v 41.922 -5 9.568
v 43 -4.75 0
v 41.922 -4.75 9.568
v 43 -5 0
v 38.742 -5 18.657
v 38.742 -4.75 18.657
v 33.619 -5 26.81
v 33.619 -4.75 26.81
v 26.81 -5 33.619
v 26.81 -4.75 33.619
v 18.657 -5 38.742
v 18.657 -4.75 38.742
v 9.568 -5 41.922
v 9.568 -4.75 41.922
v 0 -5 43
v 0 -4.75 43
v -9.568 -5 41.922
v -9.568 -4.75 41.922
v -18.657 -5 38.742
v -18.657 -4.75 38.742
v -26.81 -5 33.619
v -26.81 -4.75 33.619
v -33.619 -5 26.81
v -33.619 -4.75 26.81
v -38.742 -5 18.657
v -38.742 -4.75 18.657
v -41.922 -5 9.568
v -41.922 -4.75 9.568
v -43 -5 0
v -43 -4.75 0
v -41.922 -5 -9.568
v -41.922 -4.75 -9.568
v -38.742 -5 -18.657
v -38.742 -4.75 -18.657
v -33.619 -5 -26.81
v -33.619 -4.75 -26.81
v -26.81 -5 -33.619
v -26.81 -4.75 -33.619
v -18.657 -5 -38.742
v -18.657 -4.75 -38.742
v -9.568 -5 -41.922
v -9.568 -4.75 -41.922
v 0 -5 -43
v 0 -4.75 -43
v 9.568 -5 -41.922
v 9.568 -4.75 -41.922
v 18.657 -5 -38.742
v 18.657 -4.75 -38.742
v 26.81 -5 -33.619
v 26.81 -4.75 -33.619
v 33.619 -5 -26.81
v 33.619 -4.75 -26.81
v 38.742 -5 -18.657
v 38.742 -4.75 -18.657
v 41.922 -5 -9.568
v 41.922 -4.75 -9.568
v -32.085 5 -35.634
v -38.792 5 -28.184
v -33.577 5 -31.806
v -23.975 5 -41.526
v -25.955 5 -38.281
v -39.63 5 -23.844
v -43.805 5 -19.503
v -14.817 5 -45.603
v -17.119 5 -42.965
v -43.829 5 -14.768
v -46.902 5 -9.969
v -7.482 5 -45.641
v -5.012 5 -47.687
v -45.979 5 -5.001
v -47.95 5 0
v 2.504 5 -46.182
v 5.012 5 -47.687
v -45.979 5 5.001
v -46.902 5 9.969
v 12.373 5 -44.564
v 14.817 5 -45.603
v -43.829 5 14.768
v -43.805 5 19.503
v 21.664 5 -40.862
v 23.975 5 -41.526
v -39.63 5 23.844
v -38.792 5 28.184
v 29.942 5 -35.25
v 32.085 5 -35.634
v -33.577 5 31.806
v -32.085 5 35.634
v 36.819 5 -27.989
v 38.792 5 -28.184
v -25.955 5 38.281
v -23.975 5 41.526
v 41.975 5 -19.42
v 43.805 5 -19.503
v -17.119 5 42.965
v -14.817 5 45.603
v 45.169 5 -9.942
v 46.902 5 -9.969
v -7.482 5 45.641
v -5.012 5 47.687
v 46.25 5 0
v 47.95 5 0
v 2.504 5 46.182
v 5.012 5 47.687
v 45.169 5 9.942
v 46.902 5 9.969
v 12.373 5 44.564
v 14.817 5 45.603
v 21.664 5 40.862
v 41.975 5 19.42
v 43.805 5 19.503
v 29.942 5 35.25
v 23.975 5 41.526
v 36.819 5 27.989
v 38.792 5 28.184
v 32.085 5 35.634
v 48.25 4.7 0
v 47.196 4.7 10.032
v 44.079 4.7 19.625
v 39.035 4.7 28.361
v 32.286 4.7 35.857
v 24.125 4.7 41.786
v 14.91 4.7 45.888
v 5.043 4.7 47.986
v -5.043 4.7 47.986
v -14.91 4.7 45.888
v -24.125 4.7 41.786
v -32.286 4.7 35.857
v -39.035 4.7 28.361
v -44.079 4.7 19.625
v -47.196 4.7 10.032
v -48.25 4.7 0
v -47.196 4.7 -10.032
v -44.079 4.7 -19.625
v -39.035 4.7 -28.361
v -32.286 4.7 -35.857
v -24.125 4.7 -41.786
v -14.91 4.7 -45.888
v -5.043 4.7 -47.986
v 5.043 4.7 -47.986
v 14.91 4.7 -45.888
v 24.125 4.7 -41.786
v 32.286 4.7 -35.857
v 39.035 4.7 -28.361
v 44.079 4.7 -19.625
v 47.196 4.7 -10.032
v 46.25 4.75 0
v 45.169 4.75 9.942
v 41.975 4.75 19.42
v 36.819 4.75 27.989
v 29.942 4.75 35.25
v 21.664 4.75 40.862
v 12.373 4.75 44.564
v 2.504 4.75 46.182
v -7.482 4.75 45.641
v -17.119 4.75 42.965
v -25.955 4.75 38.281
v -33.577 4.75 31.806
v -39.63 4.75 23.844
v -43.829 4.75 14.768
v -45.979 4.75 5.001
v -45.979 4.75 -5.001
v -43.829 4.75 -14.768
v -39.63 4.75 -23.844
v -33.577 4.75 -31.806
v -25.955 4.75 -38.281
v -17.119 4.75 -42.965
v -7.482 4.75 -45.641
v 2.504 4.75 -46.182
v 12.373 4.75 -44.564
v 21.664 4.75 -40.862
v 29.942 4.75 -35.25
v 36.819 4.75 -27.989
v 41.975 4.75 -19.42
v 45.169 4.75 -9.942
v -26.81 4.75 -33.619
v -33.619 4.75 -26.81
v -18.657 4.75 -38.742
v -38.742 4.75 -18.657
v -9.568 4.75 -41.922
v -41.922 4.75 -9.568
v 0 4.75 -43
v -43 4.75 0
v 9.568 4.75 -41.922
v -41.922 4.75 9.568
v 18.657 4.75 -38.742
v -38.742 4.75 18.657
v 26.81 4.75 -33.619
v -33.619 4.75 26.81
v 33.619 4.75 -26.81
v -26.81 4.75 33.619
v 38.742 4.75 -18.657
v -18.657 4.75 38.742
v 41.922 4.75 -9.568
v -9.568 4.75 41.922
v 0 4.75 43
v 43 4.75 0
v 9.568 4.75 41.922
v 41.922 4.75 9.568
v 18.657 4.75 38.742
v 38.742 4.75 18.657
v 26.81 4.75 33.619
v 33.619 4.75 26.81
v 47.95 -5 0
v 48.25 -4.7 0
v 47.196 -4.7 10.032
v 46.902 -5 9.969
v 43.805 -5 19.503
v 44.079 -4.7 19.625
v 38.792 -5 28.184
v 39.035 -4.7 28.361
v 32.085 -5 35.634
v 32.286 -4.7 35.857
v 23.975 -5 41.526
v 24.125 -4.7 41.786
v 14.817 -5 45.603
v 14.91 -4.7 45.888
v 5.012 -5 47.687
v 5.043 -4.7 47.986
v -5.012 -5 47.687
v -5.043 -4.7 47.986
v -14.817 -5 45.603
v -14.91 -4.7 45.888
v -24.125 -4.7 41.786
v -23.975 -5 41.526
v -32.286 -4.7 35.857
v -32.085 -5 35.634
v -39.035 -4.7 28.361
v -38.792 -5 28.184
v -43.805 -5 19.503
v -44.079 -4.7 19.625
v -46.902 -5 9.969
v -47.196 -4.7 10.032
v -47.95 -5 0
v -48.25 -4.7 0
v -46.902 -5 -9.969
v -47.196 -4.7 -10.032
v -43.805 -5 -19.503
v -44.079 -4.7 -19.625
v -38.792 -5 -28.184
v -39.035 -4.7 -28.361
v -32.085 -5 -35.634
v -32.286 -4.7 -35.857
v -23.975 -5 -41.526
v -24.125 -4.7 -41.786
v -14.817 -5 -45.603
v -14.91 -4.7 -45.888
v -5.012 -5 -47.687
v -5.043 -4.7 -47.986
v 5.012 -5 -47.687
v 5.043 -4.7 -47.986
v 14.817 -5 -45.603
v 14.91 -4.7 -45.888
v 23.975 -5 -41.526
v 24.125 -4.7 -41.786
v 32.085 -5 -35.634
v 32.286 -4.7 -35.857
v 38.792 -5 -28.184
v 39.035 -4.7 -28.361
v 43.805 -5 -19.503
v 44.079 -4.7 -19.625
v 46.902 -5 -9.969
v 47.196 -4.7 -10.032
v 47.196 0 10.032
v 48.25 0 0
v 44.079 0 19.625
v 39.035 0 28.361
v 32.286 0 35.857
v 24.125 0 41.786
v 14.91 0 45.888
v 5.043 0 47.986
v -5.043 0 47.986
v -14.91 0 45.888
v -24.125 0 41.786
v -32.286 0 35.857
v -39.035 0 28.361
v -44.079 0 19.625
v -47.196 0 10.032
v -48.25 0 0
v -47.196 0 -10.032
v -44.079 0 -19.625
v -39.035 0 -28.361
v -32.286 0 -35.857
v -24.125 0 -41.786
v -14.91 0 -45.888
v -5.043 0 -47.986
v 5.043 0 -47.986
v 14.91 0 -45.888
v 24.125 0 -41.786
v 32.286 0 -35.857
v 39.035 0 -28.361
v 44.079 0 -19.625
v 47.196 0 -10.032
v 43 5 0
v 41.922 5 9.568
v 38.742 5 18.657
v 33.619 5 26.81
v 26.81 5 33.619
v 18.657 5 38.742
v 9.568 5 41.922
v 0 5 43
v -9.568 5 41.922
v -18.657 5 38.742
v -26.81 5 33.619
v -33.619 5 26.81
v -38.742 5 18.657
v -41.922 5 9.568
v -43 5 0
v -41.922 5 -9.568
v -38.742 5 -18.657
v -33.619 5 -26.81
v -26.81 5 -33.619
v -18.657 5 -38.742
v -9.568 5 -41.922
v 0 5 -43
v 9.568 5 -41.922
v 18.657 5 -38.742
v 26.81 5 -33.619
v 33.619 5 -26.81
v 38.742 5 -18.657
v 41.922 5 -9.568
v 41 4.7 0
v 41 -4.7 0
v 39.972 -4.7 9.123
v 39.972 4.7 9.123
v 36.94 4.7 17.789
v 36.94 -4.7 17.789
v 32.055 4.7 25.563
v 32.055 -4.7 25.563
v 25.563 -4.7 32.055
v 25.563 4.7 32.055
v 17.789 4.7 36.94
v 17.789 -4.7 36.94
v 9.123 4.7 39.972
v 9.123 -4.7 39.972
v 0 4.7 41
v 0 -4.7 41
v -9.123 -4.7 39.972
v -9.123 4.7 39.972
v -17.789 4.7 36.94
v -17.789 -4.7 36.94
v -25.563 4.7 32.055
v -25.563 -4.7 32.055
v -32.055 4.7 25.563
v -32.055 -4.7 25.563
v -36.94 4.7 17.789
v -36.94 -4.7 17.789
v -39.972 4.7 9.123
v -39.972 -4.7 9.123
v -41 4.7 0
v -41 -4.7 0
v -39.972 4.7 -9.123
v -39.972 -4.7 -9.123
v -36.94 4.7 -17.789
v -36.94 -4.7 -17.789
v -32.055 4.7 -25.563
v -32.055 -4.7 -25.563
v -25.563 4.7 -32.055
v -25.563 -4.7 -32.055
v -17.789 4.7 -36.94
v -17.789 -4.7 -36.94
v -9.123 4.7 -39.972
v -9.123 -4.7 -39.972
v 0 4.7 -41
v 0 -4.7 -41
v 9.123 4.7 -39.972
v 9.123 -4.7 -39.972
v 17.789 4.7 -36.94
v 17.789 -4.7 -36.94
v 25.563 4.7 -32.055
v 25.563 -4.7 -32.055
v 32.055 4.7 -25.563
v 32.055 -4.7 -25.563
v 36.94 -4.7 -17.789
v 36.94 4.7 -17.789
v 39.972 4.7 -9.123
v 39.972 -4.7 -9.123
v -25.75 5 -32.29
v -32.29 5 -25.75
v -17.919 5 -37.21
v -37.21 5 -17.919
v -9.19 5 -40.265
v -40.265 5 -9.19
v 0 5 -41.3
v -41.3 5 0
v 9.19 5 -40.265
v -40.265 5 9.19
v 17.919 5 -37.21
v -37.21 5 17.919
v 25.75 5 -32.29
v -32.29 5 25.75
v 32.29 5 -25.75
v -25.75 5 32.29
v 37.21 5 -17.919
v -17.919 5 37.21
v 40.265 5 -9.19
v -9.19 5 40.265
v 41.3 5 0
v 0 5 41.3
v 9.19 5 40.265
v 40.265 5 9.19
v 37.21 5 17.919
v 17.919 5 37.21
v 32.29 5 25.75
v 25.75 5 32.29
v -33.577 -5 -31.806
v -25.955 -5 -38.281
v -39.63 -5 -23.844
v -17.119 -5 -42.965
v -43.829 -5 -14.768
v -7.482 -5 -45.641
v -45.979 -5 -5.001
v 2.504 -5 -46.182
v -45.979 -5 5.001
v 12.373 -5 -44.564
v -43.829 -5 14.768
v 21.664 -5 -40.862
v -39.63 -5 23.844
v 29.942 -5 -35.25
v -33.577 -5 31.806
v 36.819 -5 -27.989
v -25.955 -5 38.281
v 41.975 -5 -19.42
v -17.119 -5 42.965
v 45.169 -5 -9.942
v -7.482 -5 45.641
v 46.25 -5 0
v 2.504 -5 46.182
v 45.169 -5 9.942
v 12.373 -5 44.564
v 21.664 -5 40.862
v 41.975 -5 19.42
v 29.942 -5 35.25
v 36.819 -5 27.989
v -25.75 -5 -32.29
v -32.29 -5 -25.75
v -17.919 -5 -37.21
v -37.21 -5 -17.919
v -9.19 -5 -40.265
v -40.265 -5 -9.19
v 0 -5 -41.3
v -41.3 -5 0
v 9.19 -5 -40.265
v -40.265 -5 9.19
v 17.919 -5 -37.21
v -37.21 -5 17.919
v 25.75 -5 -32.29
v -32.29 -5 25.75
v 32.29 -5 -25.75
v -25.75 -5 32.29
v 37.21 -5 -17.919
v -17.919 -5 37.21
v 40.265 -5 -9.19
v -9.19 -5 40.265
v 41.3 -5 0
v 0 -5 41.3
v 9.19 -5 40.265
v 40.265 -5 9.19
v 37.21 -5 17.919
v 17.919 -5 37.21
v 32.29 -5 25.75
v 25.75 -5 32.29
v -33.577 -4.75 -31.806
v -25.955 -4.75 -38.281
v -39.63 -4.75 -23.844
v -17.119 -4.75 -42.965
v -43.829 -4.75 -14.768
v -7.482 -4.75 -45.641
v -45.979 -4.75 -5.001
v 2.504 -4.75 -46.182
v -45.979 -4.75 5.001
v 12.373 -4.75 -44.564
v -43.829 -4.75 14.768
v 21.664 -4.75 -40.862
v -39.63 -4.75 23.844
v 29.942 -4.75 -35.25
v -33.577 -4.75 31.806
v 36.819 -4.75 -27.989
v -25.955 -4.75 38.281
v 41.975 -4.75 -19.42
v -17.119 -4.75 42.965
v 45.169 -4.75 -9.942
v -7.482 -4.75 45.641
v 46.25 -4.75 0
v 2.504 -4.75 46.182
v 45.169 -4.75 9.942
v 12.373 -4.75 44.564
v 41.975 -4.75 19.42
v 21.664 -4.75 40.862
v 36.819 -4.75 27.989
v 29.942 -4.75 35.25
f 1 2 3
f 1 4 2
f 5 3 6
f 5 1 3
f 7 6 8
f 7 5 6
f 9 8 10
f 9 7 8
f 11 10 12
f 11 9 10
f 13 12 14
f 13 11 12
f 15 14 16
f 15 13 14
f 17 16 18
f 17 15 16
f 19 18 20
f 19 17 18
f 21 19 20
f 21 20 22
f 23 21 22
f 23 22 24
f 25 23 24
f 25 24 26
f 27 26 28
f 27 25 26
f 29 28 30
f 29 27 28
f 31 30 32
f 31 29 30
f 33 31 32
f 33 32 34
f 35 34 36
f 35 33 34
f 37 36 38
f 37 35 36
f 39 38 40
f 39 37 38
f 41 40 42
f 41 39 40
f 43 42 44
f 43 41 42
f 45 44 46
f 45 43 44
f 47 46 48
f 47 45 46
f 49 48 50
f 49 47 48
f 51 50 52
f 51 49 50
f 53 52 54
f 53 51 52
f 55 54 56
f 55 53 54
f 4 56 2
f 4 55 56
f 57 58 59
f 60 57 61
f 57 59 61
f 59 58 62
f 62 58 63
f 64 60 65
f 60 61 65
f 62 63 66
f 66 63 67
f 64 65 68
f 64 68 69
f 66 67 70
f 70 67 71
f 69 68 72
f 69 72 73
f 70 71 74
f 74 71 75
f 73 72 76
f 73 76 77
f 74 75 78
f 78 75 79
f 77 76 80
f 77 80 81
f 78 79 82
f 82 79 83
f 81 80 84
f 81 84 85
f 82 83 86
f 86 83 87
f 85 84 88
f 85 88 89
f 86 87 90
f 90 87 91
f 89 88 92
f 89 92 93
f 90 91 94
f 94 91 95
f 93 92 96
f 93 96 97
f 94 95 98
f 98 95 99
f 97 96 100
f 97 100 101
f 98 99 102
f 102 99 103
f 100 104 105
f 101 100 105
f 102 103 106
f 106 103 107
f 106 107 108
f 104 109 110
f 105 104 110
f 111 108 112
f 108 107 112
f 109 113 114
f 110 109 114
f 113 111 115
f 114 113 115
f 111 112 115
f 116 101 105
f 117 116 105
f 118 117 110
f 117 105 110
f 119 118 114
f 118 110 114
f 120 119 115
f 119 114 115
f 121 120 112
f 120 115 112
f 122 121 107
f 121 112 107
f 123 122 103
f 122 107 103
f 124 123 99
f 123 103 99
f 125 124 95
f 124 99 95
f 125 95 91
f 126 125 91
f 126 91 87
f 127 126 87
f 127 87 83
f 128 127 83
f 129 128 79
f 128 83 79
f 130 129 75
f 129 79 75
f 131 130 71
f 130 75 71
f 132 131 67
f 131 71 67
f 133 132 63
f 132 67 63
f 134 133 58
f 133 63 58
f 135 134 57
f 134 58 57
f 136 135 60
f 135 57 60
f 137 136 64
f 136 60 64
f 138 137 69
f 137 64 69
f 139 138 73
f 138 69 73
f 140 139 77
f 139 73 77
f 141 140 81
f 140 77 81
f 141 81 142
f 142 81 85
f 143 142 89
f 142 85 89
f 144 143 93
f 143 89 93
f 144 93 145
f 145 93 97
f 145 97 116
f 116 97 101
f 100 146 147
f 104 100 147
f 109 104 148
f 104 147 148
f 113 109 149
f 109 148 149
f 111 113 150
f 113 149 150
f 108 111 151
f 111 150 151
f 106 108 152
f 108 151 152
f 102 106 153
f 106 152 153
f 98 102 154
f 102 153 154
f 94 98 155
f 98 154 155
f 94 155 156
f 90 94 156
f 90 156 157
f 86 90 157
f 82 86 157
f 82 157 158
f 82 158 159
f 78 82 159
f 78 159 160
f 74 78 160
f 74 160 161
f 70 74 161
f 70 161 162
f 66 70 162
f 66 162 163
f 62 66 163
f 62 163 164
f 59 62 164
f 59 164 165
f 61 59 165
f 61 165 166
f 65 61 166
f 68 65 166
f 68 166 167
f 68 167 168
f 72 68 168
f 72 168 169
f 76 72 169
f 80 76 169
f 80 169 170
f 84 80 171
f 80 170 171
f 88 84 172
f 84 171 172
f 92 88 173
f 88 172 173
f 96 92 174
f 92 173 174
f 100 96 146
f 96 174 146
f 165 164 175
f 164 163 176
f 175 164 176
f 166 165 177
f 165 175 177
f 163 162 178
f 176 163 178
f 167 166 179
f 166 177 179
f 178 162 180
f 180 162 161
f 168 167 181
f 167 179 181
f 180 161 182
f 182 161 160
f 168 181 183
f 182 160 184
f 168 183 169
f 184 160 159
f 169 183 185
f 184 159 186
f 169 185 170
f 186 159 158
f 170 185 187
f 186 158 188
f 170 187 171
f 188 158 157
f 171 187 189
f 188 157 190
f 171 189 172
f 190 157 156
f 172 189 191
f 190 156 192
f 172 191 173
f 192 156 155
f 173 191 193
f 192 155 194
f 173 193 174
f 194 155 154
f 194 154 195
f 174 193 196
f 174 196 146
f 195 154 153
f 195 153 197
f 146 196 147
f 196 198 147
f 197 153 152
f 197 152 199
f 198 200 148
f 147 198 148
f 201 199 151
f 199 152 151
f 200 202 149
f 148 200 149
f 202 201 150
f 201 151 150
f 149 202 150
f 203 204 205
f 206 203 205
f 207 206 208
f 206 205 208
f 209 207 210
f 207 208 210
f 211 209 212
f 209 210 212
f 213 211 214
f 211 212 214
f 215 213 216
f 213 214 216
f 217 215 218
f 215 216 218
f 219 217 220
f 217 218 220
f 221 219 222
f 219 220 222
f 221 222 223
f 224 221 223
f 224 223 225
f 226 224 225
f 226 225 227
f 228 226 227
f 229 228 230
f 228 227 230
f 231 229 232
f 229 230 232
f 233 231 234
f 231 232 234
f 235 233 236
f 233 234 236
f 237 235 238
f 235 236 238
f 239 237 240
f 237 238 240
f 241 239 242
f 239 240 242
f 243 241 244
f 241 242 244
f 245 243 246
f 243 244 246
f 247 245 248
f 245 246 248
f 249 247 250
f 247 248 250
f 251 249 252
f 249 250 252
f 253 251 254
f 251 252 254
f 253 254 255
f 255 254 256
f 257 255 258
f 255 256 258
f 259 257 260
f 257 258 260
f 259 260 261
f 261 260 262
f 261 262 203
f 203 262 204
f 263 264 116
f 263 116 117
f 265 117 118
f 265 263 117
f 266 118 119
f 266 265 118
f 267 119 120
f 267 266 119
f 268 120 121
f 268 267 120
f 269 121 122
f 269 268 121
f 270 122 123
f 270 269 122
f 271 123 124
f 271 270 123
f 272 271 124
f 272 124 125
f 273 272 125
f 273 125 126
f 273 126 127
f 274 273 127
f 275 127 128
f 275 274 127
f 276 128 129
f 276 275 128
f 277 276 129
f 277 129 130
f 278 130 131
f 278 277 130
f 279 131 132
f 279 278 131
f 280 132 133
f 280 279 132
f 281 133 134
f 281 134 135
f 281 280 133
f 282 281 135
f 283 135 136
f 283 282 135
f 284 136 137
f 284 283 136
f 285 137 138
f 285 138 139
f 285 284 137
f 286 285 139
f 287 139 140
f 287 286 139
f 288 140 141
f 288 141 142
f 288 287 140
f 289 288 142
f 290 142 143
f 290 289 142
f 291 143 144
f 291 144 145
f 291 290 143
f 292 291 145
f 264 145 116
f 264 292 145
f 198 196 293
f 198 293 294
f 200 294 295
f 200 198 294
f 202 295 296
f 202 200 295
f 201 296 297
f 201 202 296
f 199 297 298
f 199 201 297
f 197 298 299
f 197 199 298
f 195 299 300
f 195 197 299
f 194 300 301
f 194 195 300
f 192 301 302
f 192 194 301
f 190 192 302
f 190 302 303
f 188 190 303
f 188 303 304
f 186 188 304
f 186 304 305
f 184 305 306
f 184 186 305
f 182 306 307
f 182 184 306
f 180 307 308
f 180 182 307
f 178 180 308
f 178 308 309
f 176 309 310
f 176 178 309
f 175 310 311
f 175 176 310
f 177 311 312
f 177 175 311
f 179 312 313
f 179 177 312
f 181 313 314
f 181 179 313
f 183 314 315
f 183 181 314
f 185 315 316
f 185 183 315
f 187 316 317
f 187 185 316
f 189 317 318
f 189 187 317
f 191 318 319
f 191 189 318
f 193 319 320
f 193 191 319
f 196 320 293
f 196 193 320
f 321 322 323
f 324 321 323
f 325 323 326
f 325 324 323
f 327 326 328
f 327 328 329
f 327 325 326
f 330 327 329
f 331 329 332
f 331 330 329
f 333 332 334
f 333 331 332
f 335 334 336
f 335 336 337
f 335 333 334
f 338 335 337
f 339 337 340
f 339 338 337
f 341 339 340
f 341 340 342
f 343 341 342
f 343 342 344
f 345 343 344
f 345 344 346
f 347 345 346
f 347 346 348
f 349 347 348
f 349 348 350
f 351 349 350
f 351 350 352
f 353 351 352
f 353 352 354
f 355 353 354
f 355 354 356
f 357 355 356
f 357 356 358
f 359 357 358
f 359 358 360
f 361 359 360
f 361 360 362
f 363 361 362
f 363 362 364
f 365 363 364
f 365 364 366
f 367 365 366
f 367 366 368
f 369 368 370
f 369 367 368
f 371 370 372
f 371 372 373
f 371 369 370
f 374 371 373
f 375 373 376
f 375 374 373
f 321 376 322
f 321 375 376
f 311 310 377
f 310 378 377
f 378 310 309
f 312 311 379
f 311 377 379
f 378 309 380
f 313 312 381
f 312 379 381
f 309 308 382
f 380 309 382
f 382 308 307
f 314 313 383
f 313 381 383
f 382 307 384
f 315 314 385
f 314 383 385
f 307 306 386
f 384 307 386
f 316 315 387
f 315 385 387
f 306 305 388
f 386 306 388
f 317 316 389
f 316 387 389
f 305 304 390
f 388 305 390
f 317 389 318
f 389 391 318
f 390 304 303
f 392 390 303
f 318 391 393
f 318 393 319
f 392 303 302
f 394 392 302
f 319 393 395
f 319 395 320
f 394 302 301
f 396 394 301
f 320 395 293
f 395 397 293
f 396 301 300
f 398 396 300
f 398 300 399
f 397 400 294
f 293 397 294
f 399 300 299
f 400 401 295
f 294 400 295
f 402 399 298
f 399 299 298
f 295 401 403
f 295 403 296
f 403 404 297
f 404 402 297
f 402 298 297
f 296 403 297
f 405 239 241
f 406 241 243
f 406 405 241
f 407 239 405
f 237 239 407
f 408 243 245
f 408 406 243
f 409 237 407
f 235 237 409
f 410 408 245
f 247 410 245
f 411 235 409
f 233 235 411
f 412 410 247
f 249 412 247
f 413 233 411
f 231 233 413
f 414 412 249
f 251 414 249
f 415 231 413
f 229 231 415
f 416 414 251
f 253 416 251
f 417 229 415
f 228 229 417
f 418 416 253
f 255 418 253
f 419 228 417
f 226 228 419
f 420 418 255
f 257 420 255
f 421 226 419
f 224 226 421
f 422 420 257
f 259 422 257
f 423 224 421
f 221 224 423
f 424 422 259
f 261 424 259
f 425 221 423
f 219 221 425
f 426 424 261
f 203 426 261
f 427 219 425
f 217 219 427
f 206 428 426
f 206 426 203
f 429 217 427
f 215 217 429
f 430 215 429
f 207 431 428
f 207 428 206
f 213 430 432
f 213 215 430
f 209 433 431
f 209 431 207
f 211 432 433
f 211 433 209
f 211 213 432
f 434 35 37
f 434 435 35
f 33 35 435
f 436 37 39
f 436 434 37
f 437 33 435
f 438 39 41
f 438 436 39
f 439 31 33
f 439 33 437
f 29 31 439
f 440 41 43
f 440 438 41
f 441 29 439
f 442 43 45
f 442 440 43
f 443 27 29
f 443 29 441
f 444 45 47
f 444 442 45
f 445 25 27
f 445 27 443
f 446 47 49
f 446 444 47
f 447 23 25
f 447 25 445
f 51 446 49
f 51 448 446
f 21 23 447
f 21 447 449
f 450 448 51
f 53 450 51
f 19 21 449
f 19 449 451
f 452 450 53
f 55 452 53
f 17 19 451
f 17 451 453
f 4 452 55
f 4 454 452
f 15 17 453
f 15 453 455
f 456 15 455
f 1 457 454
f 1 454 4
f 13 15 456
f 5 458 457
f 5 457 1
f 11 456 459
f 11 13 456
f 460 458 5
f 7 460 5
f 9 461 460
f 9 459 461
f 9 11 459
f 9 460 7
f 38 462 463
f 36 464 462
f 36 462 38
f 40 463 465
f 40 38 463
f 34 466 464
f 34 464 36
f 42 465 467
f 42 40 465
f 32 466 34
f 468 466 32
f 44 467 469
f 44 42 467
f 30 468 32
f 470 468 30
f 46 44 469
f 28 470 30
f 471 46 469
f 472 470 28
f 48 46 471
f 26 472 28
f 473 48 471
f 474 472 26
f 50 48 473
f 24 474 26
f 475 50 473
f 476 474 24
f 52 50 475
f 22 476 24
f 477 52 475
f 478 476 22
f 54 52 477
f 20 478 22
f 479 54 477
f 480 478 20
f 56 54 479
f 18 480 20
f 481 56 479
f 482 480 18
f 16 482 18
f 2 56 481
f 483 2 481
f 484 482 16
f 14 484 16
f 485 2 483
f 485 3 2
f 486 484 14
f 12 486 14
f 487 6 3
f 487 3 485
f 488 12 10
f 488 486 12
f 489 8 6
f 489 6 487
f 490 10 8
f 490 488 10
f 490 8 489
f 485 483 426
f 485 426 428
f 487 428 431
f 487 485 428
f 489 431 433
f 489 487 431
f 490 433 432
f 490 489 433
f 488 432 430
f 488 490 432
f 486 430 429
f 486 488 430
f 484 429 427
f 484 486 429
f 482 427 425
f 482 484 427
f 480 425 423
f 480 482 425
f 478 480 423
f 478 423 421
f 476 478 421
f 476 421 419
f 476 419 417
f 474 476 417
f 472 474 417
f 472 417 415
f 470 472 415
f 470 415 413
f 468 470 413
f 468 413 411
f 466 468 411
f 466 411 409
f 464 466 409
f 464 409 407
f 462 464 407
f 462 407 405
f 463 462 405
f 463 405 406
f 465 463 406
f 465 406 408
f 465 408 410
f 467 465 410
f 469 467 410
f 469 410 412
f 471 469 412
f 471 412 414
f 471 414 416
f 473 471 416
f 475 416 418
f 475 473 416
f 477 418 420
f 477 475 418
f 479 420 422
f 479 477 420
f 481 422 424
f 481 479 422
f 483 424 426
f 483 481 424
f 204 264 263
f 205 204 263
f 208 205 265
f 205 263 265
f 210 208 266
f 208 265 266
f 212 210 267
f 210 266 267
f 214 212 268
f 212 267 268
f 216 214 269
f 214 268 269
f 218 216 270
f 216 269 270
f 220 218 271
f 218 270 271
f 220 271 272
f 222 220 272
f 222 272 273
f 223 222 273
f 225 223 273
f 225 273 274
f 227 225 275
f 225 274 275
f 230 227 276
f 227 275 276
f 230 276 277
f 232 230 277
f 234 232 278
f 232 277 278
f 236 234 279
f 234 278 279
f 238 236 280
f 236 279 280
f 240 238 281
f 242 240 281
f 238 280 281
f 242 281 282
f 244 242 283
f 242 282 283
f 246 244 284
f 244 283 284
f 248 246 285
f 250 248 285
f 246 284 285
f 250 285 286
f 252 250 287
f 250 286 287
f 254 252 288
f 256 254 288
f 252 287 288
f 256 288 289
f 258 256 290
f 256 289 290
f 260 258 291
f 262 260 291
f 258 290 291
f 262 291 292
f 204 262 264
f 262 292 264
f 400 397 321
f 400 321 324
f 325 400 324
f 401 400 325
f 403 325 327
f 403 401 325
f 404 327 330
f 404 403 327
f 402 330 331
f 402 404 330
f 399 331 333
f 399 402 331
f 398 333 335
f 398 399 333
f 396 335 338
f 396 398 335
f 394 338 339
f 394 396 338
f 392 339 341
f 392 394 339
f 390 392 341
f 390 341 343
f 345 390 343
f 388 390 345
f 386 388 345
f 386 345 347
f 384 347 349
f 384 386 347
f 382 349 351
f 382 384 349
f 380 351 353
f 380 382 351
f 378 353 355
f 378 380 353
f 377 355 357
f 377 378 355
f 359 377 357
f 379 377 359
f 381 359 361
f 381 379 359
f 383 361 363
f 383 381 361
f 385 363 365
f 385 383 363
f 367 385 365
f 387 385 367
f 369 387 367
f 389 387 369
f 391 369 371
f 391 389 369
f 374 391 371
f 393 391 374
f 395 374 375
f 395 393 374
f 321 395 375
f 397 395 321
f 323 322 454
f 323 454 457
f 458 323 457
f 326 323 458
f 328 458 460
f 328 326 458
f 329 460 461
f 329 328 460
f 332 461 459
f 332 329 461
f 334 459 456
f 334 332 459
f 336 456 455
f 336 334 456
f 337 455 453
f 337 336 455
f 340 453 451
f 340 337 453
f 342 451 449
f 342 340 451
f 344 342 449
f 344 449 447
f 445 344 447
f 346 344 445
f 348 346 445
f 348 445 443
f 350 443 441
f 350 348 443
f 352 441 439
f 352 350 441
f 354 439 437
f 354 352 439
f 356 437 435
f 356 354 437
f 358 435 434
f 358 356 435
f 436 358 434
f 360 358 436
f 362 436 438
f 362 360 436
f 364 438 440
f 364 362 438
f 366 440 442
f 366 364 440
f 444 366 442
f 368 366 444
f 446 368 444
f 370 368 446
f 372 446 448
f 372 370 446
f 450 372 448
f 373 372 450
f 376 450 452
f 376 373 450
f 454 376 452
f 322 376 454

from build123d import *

# Parameters (mm, degrees)
F0_R     = 48.25
F0_R_2   = 46.25
F0_R_3   = 43
F0_R_4   = 41
F1_DEPTH = 5
F2_DEPTH = 4.75
F3_SIZE  = 0.3


with BuildPart() as f1:
    # F0 (on Front) → F1 (new body, symmetric)
    with BuildSketch(Plane.XZ):
        Circle(F0_R)
        Circle(F0_R_2, mode=Mode.SUBTRACT)
        Circle(F0_R_3)
        Circle(F0_R_4, mode=Mode.SUBTRACT)
    extrude(amount=F1_DEPTH, both=True)

    # F0 (on Front) → F2 (join, symmetric)
    with BuildSketch(Plane.XZ):
        Circle(F0_R_2)
        Circle(F0_R_3, mode=Mode.SUBTRACT)
    extrude(amount=F2_DEPTH, both=True)

    # F3
    f3_edges = [f1.edges().sort_by_distance(p)[0] for p in [
        (-48.25, 5, 0),
        (48.25, 0, 0),
        (-48.25, -5, 0),
        (-41, -5, 0),
        (41, 0, 0),
        (-41, 5, 0),
    ]]
    chamfer(f3_edges, length=F3_SIZE)


solid = f1.part
